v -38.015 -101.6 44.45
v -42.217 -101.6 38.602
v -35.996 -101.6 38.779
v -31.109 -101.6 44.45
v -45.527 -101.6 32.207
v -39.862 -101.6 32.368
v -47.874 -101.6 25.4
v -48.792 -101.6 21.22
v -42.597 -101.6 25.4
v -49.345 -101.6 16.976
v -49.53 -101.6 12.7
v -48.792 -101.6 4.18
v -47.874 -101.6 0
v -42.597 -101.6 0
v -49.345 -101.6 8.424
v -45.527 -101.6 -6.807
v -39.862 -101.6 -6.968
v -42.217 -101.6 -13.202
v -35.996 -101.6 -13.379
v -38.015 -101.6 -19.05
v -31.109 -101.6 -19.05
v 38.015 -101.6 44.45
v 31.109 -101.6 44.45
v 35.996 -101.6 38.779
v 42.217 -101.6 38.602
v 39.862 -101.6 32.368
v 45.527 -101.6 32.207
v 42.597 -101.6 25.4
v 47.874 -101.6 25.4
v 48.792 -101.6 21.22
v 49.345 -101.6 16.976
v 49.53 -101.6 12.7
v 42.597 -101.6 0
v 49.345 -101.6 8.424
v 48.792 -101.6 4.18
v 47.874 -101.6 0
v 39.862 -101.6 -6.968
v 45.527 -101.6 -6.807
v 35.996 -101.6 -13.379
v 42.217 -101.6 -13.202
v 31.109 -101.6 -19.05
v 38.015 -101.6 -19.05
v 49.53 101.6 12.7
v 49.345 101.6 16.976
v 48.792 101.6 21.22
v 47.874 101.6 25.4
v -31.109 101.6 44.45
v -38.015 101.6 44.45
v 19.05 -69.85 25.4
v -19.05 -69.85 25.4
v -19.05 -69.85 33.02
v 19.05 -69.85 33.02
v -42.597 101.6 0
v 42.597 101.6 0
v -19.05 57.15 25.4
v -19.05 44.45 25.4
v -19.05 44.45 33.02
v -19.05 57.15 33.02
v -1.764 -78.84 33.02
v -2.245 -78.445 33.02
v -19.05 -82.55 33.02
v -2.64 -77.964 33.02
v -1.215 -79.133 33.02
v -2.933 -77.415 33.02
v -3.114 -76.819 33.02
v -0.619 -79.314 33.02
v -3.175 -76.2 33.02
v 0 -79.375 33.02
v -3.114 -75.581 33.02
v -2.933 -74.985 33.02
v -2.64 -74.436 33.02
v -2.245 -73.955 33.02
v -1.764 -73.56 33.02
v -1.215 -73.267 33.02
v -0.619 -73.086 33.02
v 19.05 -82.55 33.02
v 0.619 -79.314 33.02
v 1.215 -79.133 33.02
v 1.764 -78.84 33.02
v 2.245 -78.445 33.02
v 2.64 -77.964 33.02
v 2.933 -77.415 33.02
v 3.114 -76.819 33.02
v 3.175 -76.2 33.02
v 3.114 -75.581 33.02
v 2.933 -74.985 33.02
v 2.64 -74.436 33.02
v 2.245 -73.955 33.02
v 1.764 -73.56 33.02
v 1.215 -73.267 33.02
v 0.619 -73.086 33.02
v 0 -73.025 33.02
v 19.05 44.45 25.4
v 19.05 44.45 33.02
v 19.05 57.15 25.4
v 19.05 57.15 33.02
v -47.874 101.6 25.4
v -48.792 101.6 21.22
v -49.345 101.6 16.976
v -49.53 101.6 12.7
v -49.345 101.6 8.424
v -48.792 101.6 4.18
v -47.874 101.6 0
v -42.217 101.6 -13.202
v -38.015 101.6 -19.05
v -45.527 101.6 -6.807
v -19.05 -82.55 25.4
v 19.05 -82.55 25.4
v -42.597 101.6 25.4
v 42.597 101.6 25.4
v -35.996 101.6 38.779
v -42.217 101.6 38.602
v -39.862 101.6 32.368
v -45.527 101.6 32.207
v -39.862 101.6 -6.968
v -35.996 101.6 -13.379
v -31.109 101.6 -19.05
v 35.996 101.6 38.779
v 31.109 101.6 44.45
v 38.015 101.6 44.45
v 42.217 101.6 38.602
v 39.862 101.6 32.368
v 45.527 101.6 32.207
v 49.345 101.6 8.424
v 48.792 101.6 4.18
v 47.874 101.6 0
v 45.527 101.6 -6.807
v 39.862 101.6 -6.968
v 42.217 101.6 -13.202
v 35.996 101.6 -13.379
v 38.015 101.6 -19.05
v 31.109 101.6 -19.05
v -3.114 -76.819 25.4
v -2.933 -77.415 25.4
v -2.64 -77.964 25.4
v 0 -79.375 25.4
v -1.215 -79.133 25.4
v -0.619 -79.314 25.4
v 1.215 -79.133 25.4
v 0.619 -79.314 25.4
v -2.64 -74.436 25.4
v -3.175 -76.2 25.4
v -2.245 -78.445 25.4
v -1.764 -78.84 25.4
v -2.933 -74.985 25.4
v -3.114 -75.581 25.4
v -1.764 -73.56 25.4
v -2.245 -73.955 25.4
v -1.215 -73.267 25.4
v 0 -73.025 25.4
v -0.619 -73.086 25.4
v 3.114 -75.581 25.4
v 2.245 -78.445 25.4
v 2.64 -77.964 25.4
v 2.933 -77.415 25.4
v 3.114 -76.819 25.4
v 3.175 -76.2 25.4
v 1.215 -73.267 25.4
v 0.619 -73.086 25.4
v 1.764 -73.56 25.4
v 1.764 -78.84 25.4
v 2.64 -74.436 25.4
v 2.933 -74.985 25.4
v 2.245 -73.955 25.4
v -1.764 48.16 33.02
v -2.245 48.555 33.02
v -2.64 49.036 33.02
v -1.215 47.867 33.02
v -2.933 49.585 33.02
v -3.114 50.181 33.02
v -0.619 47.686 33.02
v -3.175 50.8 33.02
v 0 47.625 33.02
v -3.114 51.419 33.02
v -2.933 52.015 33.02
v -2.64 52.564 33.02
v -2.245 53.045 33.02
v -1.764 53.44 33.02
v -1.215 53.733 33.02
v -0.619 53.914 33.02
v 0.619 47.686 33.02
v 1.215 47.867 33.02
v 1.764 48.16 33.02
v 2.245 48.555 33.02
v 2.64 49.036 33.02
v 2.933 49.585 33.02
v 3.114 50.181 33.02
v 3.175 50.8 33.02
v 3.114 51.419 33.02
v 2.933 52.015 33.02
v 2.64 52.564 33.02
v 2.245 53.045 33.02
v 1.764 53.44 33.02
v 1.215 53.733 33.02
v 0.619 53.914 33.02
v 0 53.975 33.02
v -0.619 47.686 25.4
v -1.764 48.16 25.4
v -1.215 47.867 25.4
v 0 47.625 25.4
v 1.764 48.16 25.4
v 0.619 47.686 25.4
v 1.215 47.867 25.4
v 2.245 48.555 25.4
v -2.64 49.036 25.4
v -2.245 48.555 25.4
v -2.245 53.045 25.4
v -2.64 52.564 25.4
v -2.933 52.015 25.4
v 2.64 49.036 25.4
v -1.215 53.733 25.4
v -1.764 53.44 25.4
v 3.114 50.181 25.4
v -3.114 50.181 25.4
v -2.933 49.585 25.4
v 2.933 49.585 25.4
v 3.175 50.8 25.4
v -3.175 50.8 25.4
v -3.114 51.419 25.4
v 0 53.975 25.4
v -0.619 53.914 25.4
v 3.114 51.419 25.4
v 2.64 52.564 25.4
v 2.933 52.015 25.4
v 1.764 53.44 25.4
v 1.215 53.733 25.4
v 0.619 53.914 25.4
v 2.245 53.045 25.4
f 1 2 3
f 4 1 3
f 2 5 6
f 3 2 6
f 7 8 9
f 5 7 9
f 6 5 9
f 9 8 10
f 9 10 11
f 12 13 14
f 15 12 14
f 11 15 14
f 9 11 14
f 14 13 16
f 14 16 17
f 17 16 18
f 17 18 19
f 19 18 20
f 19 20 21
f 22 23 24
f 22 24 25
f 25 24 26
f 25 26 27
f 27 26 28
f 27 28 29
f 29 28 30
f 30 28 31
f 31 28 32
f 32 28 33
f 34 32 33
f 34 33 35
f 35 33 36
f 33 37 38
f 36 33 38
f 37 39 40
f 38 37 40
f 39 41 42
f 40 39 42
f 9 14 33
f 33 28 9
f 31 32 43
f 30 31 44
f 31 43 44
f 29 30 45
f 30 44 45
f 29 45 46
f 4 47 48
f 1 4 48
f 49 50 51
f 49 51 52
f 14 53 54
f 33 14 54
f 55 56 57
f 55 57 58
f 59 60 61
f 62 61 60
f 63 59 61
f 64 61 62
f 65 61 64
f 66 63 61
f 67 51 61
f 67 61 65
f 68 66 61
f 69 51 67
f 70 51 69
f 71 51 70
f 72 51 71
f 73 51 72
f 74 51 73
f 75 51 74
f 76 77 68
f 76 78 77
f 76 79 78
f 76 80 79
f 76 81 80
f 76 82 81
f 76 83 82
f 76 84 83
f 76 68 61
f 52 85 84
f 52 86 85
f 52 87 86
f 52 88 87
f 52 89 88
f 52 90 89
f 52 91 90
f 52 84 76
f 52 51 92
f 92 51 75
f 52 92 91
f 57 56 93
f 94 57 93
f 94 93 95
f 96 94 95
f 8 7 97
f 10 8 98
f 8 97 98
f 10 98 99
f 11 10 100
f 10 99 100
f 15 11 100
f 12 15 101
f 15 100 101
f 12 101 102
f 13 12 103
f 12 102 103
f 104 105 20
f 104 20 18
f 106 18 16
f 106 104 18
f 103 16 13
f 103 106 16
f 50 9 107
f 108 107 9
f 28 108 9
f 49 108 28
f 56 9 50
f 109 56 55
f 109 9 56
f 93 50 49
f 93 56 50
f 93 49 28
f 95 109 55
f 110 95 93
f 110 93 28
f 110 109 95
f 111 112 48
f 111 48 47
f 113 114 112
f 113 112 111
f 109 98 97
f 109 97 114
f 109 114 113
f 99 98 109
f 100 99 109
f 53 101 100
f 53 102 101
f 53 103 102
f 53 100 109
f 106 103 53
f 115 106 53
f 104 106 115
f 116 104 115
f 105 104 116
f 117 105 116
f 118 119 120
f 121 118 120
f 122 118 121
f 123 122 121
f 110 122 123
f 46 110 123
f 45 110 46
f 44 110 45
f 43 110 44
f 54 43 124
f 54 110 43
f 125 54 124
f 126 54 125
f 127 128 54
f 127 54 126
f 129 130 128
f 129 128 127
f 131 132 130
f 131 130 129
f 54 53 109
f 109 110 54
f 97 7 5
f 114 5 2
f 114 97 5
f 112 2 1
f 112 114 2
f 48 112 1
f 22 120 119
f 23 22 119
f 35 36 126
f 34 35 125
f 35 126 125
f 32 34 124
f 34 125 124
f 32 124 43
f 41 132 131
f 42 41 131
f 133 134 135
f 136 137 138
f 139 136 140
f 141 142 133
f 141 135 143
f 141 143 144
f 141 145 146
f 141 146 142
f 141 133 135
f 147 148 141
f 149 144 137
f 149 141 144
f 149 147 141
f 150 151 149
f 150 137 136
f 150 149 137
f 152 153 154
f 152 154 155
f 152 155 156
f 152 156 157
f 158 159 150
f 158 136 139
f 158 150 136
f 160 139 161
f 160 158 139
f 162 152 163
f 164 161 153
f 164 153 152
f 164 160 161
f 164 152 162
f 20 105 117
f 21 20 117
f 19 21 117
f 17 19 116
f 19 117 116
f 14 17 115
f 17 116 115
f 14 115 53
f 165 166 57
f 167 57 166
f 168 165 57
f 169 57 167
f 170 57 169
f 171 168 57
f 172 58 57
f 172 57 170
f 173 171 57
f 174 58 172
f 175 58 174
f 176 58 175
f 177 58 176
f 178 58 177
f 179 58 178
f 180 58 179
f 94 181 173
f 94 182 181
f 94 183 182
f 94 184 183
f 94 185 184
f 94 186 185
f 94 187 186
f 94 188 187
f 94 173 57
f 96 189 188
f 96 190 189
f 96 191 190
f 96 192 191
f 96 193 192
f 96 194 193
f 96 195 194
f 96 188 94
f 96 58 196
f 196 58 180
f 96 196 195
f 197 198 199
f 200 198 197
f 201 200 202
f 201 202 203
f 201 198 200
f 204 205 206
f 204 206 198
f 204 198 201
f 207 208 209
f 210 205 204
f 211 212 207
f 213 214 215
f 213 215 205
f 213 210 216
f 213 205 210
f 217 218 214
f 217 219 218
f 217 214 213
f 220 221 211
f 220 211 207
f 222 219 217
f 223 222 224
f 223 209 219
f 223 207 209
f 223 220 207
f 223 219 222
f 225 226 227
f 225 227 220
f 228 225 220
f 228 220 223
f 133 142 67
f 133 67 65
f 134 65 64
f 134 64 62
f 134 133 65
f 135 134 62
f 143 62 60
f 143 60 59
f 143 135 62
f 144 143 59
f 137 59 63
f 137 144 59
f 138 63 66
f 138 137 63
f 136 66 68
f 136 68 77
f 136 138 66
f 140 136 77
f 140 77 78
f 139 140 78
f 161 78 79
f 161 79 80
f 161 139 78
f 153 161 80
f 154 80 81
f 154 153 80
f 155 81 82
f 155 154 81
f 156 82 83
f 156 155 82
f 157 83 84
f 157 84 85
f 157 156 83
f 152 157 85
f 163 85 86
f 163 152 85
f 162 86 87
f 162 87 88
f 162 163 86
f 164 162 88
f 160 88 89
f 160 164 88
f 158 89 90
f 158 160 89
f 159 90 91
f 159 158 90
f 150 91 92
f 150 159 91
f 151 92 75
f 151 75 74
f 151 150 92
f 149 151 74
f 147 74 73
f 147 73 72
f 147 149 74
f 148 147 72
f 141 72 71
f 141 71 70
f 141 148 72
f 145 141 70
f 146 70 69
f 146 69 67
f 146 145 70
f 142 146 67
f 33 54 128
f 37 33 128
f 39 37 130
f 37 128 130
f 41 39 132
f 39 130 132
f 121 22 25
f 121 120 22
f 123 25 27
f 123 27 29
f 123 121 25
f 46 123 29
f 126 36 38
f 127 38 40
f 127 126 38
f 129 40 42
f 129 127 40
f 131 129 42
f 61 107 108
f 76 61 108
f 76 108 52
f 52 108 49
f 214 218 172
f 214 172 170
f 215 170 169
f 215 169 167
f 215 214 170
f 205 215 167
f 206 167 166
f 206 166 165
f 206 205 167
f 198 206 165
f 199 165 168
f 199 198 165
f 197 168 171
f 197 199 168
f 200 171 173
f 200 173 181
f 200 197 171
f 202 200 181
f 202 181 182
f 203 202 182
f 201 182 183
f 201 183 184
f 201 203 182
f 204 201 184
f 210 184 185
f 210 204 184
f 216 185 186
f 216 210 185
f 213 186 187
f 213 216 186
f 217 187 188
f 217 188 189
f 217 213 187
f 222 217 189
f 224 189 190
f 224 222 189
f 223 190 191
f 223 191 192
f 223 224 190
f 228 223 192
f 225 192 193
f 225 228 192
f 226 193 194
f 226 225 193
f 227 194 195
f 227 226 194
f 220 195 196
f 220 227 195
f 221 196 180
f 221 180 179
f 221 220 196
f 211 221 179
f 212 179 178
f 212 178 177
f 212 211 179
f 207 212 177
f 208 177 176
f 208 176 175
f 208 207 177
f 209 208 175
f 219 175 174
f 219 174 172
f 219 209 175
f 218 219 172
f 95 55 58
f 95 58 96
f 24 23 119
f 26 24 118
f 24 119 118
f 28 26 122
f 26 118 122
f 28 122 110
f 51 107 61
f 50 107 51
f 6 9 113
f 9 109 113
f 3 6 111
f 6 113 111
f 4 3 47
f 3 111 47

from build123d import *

# Parameters (mm, degrees)
SKETCH1_W           = 99.06
SKETCH1_H           = 203.2
BOSS_EXTRUDE1_DEPTH = 25.4
SKETCH2_R           = 49.53
SKETCH2_R_2         = 44.45
BOSS_EXTRUDE2_DEPTH = 203.2
CUT_EXTRUDE1_DEPTH  = 219.2109846
SKETCH6_W           = 38.1
SKETCH6_H           = 12.7
SKETCH6_R           = 3.175
BOSS_EXTRUDE3_DEPTH = 7.62


with BuildPart() as part:
    # Sketch1 → Boss-Extrude1 (new body)
    with BuildSketch(Plane.XY):
        Rectangle(SKETCH1_W, SKETCH1_H)
    extrude(amount=BOSS_EXTRUDE1_DEPTH)

    # Sketch2 → Boss-Extrude2 (add, through all)
    with BuildSketch(Plane(origin=(0, 101.6, 0), x_dir=(1, 0, 0), z_dir=(0, 1, 0))):
        with Locations((0, -12.7)):
            Circle(SKETCH2_R)
        with Locations((0, -12.7)):
            Circle(SKETCH2_R_2, mode=Mode.SUBTRACT)
    extrude(amount=-BOSS_EXTRUDE2_DEPTH)

    # Sketch3 → Cut-Extrude1 (cut, through all)
    with BuildSketch(Plane(origin=(0, 101.6, 0), x_dir=(1, 0, 0), z_dir=(0, 1, 0))):
        with BuildLine():
            Line((-38.01523905, 19.05), (-47.519048812, 19.05))
            ThreePointArc((-47.519048812, 19.05), (-57.15, -12.7), (-47.519048812, -44.45))
            Line((-47.519048812, -44.45), (-38.01523905, -44.45))
            ThreePointArc((-38.01523905, -44.45), (-43.988304304, -35.465104533), (-47.874115135, -25.4))
            Line((-47.874115135, -25.4), (-49.53, -25.4))
            Line((-49.53, -25.4), (-49.53, -12.7))
            Line((-49.53, -12.7), (-49.53, 0))
            Line((-49.53, 0), (-47.874115135, 0))
            ThreePointArc((-47.874115135, 0), (-43.988304304, 10.065104533), (-38.01523905, 19.05))
        make_face()
        with BuildLine():
            Line((47.519048812, 19.05), (38.01523905, 19.05))
            ThreePointArc((38.01523905, 19.05), (43.988304304, 10.065104533), (47.874115135, 0))
            Line((47.874115135, 0), (49.53, 0))
            Line((49.53, 0), (49.53, -12.7))
            Line((49.53, -12.7), (49.53, -25.4))
            Line((49.53, -25.4), (47.874115135, -25.4))
            ThreePointArc((47.874115135, -25.4), (43.988304304, -35.465104533), (38.01523905, -44.45))
            Line((38.01523905, -44.45), (47.519048812, -44.45))
            ThreePointArc((47.519048812, -44.45), (54.689286609, -29.289286609), (57.15, -12.7))
            ThreePointArc((57.15, -12.7), (54.689286609, 3.889286609), (47.519048812, 19.05))
        make_face()
        with BuildLine():
            ThreePointArc((31.108519733, 19.05), (0, 31.75), (-31.108519733, 19.05))
            Line((-31.108519733, 19.05), (31.108519733, 19.05))
        make_face()
        with BuildLine():
            ThreePointArc((38.01523905, 19.05), (0, 36.83), (-38.01523905, 19.05))
            Line((-38.01523905, 19.05), (-31.108519733, 19.05))
            ThreePointArc((-31.108519733, 19.05), (0, 31.75), (31.108519733, 19.05))
            Line((31.108519733, 19.05), (38.01523905, 19.05))
        make_face()
        with BuildLine():
            ThreePointArc((2.76e-07, 44.45), (-26.940768242, 37.701562541), (-47.519048812, 19.05))
            Line((-47.519048812, 19.05), (-38.01523905, 19.05))
            ThreePointArc((-38.01523905, 19.05), (0, 36.83), (38.01523905, 19.05))
            Line((38.01523905, 19.05), (47.519048812, 19.05))
            ThreePointArc((47.519048812, 19.05), (26.940768485, 37.701562411), (2.76e-07, 44.45))
        make_face()
        with BuildLine():
            Line((-63.5, 44.45), (-63.5, 19.05))
            Line((-63.5, 19.05), (-47.519048812, 19.05))
            ThreePointArc((-47.519048812, 19.05), (-26.940768242, 37.701562541), (2.76e-07, 44.45))
            Line((2.76e-07, 44.45), (-63.5, 44.45))
        make_face()
        with BuildLine():
            Line((63.5, 44.45), (2.76e-07, 44.45))
            ThreePointArc((2.76e-07, 44.45), (26.940768485, 37.701562411), (47.519048812, 19.05))
            Line((47.519048812, 19.05), (63.5, 19.05))
            Line((63.5, 19.05), (63.5, 44.45))
        make_face()
        with BuildLine():
            ThreePointArc((47.519048812, -44.45), (26.940768401, -63.101562456), (8.5e-08, -69.85))
            Line((8.5e-08, -69.85), (63.5, -69.85))
            Line((63.5, -69.85), (63.5, -44.45))
            Line((63.5, -44.45), (47.519048812, -44.45))
        make_face()
        with BuildLine():
            ThreePointArc((8.5e-08, -69.85), (-26.940768326, -63.101562496), (-47.519048812, -44.45))
            Line((-47.519048812, -44.45), (-63.5, -44.45))
            Line((-63.5, -44.45), (-63.5, -69.85))
            Line((-63.5, -69.85), (8.5e-08, -69.85))
        make_face()
        with BuildLine():
            Line((-38.01523905, -44.45), (-47.519048812, -44.45))
            ThreePointArc((-47.519048812, -44.45), (-26.940768326, -63.101562496), (8.5e-08, -69.85))
            ThreePointArc((8.5e-08, -69.85), (26.940768401, -63.101562456), (47.519048812, -44.45))
            Line((47.519048812, -44.45), (38.01523905, -44.45))
            ThreePointArc((38.01523905, -44.45), (0, -62.23), (-38.01523905, -44.45))
        make_face()
        with BuildLine():
            Line((-31.108519733, -44.45), (-38.01523905, -44.45))
            ThreePointArc((-38.01523905, -44.45), (0, -62.23), (38.01523905, -44.45))
            Line((38.01523905, -44.45), (31.108519733, -44.45))
            ThreePointArc((31.108519733, -44.45), (0, -57.15), (-31.108519733, -44.45))
        make_face()
        with BuildLine():
            Line((31.108519733, -44.45), (-31.108519733, -44.45))
            ThreePointArc((-31.108519733, -44.45), (0, -57.15), (31.108519733, -44.45))
        make_face()
        with BuildLine():
            ThreePointArc((-49.53, -12.7), (-49.114284188, -6.296251983), (-47.874115135, 0))
            Line((-47.874115135, 0), (-49.53, 0))
            Line((-49.53, 0), (-49.53, -12.7))
        make_face()
        with BuildLine():
            ThreePointArc((-47.874115135, -25.4), (-49.114284188, -19.103748017), (-49.53, -12.7))
            Line((-49.53, -12.7), (-49.53, -25.4))
            Line((-49.53, -25.4), (-47.874115135, -25.4))
        make_face()
        with BuildLine():
            Line((49.53, -25.4), (49.53, -12.7))
            ThreePointArc((49.53, -12.7), (49.114284188, -19.103748017), (47.874115135, -25.4))
            Line((47.874115135, -25.4), (49.53, -25.4))
        make_face()
        with BuildLine():
            Line((49.53, 0), (47.874115135, 0))
            ThreePointArc((47.874115135, 0), (49.114284188, -6.296251983), (49.53, -12.7))
            Line((49.53, -12.7), (49.53, 0))
        make_face()
    extrude(amount=-CUT_EXTRUDE1_DEPTH, mode=Mode.SUBTRACT)

    # Sketch6 → Boss-Extrude3 (add)
    # profile 1 of 2: a face of its own
    with BuildSketch(Plane.XY.offset(25.4)):
        with Locations((0, 50.8)):
            Rectangle(SKETCH6_W, SKETCH6_H)
        with Locations(Location((0, 50.8, 0), (0, 0, 180))):
            Circle(SKETCH6_R, mode=Mode.SUBTRACT)
    # profile 2 of 2: a face of its own
    with BuildSketch(Plane.XY.offset(25.4)):
        with Locations((0, -76.2)):
            Rectangle(SKETCH6_W, SKETCH6_H)
        with Locations(Location((0, -76.2, 0), (0, 0, 180))):
            Circle(SKETCH6_R, mode=Mode.SUBTRACT)
    extrude(amount=BOSS_EXTRUDE3_DEPTH)


solid = part.part
